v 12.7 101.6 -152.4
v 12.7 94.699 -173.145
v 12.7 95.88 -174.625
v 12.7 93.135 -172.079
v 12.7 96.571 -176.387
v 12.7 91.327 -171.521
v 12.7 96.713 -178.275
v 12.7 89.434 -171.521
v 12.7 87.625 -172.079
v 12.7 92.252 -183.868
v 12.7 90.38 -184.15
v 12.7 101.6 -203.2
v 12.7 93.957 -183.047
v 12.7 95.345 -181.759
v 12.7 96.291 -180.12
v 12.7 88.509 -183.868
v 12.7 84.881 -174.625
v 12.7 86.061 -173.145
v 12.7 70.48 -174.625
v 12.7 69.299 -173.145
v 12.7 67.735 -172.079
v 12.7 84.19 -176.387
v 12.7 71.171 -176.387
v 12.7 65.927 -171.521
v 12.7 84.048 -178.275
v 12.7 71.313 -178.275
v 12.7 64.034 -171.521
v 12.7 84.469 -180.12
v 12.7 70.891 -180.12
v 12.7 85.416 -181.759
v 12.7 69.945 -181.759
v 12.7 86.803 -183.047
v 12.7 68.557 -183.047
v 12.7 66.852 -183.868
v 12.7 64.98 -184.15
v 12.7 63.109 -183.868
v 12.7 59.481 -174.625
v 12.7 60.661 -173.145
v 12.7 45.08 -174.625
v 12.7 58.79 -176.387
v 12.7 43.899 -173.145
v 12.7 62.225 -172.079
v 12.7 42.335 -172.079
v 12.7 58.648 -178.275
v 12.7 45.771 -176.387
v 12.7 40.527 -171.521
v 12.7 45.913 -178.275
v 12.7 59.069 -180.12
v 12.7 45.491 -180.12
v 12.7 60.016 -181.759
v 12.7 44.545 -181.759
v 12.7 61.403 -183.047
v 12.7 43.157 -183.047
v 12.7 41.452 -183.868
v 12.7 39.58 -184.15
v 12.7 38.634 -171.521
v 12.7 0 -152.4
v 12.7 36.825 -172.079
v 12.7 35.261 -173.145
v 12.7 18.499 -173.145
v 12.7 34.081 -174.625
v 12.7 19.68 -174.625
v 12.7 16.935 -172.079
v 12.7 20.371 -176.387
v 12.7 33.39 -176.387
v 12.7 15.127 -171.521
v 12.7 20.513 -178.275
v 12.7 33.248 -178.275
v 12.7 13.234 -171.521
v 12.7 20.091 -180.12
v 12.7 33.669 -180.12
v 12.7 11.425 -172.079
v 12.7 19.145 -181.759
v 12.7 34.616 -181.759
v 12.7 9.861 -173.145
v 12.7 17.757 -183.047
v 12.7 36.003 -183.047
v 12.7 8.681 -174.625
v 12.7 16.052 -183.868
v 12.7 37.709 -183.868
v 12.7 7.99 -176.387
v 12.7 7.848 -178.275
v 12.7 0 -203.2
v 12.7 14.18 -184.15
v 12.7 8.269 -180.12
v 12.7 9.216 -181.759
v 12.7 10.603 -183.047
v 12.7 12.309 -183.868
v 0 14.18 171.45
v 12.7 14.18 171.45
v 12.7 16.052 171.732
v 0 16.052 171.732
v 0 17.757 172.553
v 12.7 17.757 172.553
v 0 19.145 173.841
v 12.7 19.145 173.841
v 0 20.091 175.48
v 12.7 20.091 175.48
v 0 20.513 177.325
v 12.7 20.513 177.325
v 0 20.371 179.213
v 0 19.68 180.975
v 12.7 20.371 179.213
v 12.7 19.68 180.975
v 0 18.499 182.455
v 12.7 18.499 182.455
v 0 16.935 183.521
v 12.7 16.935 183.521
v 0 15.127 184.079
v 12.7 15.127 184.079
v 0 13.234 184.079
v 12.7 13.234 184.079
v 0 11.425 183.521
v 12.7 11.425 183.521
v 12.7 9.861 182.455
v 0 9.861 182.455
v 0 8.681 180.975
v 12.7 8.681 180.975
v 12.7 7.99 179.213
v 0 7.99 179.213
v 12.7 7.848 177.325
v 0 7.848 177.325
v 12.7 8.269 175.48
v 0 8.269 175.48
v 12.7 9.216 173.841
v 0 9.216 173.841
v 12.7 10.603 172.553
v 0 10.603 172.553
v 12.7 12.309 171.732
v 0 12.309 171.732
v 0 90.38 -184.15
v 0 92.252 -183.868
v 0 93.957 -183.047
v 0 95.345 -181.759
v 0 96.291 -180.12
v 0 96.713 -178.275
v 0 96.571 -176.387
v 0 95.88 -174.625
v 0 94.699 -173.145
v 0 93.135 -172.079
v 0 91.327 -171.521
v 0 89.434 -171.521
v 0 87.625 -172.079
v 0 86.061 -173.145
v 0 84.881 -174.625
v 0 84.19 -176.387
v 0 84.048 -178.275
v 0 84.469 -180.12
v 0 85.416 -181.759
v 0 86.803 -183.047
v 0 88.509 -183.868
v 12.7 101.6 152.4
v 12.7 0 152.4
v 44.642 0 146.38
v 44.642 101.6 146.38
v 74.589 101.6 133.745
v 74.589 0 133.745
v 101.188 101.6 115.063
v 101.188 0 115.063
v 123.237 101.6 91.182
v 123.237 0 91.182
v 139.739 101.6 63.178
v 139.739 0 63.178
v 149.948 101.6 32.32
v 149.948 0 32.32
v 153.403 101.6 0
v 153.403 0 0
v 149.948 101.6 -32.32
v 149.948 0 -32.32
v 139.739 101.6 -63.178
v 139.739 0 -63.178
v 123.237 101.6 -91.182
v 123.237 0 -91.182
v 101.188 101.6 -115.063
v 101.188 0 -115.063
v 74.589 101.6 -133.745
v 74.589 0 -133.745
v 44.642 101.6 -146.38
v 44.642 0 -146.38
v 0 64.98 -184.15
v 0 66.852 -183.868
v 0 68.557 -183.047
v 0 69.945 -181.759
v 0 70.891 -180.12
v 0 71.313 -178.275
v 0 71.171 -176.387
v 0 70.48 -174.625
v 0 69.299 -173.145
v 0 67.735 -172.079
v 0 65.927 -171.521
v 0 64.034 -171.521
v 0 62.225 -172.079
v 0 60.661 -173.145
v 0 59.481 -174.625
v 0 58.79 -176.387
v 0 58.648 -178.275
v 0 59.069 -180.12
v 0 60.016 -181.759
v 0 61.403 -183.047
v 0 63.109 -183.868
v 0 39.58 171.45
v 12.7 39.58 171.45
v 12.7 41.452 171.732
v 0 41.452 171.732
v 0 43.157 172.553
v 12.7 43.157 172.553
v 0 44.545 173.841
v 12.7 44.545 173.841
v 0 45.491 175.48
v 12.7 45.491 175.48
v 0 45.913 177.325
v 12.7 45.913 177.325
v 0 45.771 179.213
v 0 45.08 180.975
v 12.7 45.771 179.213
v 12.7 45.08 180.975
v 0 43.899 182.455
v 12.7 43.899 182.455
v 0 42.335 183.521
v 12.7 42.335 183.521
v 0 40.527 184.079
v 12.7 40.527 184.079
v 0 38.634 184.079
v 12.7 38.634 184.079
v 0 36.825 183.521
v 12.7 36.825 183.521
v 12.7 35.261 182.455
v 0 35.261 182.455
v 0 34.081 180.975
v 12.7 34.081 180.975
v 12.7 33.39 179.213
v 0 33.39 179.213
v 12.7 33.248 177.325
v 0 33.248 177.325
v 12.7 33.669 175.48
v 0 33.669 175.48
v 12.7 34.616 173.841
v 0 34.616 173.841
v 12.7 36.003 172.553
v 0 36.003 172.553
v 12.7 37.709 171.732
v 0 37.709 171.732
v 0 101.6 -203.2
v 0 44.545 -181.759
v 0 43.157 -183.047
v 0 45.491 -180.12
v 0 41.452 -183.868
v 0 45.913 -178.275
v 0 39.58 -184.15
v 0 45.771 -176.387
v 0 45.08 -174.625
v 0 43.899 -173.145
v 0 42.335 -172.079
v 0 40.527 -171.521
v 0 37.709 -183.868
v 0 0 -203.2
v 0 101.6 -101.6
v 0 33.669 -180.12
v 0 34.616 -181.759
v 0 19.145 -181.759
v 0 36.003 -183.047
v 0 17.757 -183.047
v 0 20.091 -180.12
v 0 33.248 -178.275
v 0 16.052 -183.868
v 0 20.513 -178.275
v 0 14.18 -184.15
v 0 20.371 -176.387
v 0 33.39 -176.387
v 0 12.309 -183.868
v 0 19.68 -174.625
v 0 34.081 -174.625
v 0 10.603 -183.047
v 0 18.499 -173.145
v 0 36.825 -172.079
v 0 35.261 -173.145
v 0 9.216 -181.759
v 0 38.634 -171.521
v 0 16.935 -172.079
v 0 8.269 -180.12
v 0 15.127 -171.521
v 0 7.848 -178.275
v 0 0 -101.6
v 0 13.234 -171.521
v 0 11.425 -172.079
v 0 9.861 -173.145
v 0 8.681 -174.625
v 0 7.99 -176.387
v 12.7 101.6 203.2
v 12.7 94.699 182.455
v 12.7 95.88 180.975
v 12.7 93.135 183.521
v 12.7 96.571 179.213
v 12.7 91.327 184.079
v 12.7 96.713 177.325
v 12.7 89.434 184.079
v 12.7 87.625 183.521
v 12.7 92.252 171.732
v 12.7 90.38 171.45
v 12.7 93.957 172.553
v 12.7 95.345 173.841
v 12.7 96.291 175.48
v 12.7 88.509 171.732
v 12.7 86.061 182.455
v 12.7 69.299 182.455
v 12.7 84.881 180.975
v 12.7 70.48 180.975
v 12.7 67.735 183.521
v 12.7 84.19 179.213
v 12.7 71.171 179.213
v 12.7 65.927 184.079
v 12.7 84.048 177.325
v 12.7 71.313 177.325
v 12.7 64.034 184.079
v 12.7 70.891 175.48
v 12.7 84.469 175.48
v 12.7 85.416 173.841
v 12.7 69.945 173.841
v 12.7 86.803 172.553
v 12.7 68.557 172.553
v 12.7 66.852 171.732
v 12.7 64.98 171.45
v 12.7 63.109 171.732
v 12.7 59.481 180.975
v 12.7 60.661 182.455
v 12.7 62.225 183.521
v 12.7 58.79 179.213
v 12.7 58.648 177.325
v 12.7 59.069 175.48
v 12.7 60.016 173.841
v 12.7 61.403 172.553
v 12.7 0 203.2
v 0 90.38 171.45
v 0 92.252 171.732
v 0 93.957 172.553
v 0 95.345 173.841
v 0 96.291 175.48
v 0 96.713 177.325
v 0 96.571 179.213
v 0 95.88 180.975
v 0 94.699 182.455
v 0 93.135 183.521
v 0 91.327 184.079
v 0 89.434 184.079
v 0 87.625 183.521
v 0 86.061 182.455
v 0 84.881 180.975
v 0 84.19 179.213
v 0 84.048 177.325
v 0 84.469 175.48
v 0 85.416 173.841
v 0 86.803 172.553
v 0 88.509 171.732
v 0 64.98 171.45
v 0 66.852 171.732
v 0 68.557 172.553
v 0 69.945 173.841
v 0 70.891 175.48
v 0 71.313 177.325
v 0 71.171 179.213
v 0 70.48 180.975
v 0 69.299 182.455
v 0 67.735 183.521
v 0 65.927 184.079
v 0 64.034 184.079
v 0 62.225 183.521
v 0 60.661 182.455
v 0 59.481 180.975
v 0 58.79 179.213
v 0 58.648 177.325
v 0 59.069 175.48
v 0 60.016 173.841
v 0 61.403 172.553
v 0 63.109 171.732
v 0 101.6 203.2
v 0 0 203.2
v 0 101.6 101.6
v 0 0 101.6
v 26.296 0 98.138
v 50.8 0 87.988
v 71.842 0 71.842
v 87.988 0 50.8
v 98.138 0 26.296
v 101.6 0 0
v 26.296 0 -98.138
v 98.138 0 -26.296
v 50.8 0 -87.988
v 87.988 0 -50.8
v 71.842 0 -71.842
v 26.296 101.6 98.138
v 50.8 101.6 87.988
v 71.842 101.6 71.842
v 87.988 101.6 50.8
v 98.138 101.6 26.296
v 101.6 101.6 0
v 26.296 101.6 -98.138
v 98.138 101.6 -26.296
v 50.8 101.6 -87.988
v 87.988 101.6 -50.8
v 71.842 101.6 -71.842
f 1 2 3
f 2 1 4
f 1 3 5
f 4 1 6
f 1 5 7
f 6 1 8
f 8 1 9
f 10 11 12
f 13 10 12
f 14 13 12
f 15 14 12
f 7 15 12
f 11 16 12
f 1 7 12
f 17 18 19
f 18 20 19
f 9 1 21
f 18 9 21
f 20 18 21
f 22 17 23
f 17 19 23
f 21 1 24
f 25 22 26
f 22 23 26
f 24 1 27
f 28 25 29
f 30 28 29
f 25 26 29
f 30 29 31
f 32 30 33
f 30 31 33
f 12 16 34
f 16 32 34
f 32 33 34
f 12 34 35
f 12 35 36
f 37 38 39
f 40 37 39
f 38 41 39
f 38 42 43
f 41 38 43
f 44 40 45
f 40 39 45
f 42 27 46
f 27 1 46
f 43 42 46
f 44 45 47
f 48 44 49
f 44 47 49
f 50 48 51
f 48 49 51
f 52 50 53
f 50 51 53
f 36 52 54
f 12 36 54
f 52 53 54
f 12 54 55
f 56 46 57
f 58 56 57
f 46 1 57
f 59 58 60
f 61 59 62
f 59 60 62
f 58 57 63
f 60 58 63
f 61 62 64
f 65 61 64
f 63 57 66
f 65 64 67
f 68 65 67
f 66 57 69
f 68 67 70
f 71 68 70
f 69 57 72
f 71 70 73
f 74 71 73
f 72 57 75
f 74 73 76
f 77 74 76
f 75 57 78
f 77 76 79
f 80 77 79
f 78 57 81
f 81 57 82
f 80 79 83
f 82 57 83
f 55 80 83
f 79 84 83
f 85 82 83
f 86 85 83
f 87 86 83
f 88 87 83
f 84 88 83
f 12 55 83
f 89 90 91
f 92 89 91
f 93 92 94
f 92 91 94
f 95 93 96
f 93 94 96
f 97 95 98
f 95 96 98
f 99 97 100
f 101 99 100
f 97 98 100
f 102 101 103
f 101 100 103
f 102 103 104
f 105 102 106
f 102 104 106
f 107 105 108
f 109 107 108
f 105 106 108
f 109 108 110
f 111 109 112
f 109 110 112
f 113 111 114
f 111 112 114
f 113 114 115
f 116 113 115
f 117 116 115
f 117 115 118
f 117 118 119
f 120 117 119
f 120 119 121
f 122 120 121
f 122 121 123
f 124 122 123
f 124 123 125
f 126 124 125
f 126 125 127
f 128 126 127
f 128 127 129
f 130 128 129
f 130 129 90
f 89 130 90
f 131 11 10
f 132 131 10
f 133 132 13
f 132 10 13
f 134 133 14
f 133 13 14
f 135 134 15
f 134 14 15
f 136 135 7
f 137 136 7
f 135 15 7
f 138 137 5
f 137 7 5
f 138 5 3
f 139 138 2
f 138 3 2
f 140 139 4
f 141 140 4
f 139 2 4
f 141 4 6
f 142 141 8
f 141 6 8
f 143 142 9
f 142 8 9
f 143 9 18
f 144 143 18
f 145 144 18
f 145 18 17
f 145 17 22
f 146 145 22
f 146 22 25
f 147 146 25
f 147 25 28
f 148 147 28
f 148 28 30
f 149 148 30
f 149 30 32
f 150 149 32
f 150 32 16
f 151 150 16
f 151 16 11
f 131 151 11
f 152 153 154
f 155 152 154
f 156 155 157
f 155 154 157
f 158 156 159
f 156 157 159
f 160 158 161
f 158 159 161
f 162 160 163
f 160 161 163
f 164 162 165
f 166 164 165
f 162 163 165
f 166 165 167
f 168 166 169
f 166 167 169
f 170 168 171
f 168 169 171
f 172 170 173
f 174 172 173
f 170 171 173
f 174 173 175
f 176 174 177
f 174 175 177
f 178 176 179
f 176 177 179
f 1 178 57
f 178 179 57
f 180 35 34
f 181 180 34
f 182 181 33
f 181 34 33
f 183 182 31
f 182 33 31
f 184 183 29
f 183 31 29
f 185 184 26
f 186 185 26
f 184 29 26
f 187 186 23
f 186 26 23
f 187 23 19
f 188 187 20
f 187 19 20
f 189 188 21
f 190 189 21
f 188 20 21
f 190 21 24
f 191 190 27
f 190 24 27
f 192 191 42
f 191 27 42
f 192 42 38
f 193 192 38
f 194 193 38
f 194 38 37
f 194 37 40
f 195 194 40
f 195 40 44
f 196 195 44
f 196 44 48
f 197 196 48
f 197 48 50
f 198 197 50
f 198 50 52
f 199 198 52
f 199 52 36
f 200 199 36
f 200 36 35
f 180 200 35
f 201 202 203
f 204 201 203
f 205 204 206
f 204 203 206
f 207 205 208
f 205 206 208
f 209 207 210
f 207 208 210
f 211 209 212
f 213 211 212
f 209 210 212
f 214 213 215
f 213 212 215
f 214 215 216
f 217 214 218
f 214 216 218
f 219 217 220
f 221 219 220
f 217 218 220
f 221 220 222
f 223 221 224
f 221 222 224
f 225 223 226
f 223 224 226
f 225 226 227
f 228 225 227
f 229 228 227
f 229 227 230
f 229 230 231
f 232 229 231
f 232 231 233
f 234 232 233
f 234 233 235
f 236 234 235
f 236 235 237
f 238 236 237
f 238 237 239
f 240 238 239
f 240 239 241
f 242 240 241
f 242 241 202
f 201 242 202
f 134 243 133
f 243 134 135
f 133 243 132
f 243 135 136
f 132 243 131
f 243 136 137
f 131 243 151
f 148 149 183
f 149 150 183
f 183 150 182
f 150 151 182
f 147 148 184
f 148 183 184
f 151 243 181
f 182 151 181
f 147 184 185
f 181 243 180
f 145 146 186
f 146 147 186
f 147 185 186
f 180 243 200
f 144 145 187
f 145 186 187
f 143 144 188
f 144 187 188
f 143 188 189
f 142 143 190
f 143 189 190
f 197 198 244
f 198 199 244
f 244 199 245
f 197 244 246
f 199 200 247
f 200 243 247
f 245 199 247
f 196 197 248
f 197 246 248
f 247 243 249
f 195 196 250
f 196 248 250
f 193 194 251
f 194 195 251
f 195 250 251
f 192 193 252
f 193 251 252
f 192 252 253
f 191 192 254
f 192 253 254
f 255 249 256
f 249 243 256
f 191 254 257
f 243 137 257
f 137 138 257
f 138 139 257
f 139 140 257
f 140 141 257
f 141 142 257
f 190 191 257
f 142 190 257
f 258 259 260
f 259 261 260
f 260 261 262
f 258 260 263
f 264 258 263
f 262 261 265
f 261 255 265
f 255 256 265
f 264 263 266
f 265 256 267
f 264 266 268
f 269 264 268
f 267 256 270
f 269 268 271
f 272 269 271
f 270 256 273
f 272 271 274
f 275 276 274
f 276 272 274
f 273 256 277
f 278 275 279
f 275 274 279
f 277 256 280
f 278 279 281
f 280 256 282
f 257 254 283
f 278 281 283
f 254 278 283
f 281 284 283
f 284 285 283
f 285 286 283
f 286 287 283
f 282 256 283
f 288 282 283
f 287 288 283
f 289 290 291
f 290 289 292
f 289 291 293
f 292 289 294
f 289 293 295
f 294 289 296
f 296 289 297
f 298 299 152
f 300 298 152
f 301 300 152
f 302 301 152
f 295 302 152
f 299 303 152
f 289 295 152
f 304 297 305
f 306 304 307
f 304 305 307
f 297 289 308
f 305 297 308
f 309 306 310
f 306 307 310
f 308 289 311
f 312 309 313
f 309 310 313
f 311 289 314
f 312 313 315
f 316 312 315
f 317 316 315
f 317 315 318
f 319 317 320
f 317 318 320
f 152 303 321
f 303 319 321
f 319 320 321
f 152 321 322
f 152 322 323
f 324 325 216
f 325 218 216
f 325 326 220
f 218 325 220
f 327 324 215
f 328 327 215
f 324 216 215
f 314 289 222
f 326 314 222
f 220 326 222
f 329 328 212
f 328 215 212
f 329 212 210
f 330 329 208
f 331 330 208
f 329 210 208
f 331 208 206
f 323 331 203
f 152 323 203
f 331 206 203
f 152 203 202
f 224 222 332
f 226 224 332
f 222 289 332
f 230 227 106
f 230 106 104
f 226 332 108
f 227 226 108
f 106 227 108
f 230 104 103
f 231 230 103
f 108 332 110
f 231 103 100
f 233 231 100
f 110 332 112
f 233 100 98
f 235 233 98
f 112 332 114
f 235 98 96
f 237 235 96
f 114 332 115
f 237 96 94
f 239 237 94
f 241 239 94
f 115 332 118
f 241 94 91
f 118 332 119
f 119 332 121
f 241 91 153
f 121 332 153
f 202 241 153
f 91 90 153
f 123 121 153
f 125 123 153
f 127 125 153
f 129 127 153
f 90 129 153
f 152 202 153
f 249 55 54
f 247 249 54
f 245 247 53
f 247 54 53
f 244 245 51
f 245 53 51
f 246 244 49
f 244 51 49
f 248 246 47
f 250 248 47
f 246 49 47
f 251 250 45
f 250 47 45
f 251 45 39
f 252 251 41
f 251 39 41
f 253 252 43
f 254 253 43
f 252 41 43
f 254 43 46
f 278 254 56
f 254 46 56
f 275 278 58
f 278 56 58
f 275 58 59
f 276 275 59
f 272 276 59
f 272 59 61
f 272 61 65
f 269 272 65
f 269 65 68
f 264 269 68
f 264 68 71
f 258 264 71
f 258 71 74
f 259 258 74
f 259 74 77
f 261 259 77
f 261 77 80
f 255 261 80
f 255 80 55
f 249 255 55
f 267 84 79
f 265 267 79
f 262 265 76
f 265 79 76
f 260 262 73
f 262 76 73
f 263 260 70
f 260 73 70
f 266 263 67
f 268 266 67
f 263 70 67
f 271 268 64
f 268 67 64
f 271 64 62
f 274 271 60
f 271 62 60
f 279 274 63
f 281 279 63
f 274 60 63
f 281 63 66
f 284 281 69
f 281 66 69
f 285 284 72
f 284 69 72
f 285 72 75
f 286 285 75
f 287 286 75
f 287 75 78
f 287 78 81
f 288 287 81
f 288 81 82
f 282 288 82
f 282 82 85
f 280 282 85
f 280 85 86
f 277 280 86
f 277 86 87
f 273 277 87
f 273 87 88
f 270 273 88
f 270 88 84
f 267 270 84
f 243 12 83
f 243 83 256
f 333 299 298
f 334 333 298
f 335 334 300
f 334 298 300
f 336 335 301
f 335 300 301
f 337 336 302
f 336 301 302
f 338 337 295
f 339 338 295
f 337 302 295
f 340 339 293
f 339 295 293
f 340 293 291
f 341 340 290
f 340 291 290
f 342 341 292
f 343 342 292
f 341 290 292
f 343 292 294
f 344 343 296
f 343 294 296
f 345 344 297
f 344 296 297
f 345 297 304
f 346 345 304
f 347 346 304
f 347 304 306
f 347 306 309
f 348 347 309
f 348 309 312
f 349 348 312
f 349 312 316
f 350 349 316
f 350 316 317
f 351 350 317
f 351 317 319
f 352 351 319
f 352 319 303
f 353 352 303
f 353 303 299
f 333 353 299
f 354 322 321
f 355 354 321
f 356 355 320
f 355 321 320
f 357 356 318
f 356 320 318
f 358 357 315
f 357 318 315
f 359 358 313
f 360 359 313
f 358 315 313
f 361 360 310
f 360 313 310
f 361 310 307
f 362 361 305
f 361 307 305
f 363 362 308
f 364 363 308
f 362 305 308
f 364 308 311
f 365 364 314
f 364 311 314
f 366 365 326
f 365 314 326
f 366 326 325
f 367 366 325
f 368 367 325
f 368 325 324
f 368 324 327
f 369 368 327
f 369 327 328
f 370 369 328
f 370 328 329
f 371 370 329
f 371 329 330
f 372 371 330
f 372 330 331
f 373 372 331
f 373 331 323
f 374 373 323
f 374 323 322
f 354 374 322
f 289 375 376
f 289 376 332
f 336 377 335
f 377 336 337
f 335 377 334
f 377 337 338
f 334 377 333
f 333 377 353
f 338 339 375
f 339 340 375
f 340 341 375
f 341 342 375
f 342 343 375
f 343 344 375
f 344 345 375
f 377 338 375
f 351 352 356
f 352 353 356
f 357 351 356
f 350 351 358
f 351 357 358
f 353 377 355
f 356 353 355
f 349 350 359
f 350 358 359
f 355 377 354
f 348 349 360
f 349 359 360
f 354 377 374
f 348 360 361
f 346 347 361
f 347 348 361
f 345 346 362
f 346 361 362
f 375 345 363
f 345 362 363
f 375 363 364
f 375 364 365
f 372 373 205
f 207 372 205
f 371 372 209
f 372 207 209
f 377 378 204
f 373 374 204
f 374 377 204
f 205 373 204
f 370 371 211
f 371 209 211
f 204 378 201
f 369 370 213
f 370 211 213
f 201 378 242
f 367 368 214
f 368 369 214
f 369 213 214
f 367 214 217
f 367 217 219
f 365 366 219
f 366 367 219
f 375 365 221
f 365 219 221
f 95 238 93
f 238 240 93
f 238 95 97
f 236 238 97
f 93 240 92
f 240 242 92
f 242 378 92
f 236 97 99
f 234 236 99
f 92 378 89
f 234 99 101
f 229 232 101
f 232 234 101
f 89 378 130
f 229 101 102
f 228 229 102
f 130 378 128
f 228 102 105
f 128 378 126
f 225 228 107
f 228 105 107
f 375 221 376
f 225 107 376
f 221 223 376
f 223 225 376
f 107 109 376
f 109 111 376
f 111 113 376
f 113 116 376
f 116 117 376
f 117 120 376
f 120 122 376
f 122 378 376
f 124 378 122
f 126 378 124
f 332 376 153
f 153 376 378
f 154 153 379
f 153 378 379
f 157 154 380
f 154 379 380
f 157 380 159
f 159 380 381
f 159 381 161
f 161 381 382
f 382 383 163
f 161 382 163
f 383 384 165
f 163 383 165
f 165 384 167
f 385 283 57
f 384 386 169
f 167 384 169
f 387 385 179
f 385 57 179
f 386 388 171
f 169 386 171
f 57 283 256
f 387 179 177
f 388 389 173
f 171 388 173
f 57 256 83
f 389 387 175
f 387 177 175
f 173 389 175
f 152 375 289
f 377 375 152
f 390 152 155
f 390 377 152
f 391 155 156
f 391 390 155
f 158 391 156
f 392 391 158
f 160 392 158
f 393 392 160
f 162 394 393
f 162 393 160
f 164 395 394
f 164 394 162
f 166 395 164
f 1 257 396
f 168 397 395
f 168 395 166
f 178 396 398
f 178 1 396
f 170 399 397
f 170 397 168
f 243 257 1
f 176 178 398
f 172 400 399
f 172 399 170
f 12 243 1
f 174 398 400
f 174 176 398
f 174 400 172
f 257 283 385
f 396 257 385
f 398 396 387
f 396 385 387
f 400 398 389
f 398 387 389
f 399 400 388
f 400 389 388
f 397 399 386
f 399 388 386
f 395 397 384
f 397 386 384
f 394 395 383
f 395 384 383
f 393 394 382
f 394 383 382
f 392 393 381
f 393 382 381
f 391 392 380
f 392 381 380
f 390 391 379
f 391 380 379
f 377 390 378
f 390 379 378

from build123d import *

# Parameters (mm, degrees)
BOSS_EXTRUDE1_DEPTH = 101.6
SKETCH2_R           = 6.35
CUT_EXTRUDE1_DEPTH  = 268.226937902
SKETCH3_R           = 6.35
CUT_EXTRUDE2_DEPTH  = 268.226937902


with BuildPart() as part:
    # Sketch1 → Boss-Extrude1 (new body)
    with BuildSketch(Plane(origin=(0, 0, 0), x_dir=(1, 0, 0), z_dir=(0, 1, 0))):
        with BuildLine():
            Line((0, -101.6), (0, -203.2))
            Line((0, -203.2), (12.7, -203.2))
            Line((12.7, -203.2), (12.7, -152.4))
            ThreePointArc((12.7, -152.4), (153.403362933, 0), (12.7, 152.4))
            Line((12.7, 152.4), (12.7, 203.2))
            Line((12.7, 203.2), (0, 203.2))
            Line((0, 203.2), (0, 101.6))
            ThreePointArc((0, 101.6), (101.6, 0), (0, -101.6))
        make_face()
    extrude(amount=BOSS_EXTRUDE1_DEPTH)

    # Sketch2 → Cut-Extrude1 (cut, through all)
    with BuildSketch(Plane(origin=(12.7, 0, 0), x_dir=(0, 0, -1), z_dir=(1, 0, 0))):
        with Locations((-177.8, 90.380321662)):
            Circle(SKETCH2_R)
        with Locations((-177.8, 64.980321662)):
            Circle(SKETCH2_R)
        with Locations((-177.8, 39.580321662)):
            Circle(SKETCH2_R)
        with Locations((-177.8, 14.180321662)):
            Circle(SKETCH2_R)
    extrude(amount=-CUT_EXTRUDE1_DEPTH, mode=Mode.SUBTRACT)

    # Sketch3 → Cut-Extrude2 (cut, through all)
    with BuildSketch(Plane(origin=(12.7, 0, 0), x_dir=(0, 0, -1), z_dir=(1, 0, 0))):
        with Locations((177.8, 90.380321662)):
            Circle(SKETCH3_R)
        with Locations((177.8, 64.980321662)):
            Circle(SKETCH3_R)
        with Locations((177.8, 39.580321662)):
            Circle(SKETCH3_R)
        with Locations((177.8, 14.180321662)):
            Circle(SKETCH3_R)
    extrude(amount=-CUT_EXTRUDE2_DEPTH, mode=Mode.SUBTRACT)


solid = part.part
